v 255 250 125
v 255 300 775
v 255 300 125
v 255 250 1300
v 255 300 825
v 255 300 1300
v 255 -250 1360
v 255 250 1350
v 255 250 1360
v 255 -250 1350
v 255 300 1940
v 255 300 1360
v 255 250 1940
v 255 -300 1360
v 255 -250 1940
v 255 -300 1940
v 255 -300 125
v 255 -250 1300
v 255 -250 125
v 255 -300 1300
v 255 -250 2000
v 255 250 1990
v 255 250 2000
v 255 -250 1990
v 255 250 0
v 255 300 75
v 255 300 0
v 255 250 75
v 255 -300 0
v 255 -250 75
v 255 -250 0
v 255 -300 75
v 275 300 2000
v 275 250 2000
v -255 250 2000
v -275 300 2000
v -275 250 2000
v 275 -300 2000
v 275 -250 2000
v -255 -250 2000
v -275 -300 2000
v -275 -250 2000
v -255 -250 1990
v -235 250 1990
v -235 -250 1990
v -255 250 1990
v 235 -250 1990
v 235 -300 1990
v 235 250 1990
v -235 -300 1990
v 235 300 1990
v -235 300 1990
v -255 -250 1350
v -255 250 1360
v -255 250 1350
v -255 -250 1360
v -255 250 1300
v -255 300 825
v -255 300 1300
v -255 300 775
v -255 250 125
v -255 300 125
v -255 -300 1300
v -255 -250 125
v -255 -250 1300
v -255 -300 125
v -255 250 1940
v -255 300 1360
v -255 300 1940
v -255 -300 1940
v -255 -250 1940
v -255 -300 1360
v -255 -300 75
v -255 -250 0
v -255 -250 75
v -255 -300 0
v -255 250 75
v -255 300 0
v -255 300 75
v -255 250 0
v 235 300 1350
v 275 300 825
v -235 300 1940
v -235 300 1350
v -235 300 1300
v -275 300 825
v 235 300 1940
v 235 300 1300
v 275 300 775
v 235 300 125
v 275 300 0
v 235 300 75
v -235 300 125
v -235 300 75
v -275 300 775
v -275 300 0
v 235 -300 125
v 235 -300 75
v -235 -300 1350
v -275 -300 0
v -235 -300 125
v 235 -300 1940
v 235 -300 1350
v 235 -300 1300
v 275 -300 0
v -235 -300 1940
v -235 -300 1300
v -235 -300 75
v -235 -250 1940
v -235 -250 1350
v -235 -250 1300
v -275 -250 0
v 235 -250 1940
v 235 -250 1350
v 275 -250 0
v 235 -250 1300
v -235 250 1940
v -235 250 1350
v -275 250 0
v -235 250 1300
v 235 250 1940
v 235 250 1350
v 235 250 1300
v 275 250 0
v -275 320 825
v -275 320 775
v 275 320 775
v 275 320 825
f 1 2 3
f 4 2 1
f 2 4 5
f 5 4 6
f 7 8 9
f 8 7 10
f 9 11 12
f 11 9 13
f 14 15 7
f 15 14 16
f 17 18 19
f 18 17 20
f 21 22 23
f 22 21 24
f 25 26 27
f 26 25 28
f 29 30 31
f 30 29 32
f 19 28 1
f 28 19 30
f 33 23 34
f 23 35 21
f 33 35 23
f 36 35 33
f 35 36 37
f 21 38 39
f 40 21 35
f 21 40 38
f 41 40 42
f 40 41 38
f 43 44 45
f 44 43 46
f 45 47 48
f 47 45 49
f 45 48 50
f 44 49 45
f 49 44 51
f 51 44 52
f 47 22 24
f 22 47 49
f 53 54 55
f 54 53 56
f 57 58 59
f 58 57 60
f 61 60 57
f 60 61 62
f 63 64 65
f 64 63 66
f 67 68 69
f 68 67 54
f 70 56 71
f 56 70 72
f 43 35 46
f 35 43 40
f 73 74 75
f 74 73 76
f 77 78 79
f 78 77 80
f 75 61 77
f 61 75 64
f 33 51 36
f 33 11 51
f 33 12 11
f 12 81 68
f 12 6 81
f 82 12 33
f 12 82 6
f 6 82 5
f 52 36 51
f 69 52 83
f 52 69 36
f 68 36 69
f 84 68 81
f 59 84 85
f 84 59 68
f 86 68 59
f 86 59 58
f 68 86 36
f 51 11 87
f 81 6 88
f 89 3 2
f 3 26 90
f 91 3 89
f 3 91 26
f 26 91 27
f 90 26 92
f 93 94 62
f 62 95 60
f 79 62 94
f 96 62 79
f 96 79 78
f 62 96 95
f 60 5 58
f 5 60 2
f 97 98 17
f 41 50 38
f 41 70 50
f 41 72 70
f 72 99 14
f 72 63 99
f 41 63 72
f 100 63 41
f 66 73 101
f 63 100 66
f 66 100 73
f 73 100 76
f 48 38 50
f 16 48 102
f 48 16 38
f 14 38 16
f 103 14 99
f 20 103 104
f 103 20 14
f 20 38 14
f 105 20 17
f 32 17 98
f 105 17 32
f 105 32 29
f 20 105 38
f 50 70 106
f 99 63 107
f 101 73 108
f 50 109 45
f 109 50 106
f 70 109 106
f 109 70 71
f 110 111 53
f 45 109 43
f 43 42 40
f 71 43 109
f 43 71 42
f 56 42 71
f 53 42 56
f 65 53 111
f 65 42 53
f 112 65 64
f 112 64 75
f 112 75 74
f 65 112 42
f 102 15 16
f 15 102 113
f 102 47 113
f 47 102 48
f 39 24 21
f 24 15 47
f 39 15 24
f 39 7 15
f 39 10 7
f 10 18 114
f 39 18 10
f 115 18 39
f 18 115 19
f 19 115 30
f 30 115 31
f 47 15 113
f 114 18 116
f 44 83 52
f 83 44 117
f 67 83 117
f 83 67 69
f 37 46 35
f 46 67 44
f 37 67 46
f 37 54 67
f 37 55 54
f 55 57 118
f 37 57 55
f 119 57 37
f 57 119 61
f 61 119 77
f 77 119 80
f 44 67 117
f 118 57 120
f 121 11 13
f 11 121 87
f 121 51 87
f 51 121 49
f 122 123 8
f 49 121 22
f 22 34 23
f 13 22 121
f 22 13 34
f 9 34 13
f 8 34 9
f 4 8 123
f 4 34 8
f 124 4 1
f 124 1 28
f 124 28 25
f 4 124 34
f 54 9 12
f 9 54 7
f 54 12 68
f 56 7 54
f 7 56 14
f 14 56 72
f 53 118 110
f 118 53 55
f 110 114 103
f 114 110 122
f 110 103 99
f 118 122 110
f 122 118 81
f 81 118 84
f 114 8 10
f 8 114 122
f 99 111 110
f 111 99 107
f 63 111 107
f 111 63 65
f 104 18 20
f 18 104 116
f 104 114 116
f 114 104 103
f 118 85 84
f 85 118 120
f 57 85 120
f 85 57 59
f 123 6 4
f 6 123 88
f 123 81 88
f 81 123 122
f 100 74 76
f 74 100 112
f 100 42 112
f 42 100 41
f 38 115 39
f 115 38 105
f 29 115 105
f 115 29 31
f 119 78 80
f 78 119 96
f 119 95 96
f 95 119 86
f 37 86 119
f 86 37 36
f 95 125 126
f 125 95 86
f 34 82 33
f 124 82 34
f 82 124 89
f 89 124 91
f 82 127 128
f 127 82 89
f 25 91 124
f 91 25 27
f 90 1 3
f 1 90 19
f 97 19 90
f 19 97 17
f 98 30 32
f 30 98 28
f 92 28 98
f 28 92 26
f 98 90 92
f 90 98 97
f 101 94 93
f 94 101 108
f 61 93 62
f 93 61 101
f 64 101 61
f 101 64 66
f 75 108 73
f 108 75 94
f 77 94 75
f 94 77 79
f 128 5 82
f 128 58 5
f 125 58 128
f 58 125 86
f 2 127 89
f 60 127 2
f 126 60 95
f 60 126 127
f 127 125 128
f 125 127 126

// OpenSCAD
feet_thickness = 20;
feet_width = 50;
height = 2000;
width = 550 - feet_thickness * 2;
depth = 600;

ply_thickness = 10;

module wood(w, h, d) {
    cube(size=[w, h, d], center=true);
    echo("Wood: ", w, h, d);
}

// Feet
translate([-(width + feet_thickness) * 0.5, -(depth - feet_width) * 0.5, height * 0.5]) {
    wood(feet_thickness, feet_width, height);
}
translate([(width + feet_thickness) * 0.5, -(depth - feet_width) * 0.5, height * 0.5]) {
    wood(feet_thickness, feet_width, height);
}
translate([-(width + feet_thickness) * 0.5, (depth - feet_width) * 0.5, height * 0.5]) {
    wood(feet_thickness, feet_width, height);
}
translate([(width + feet_thickness) * 0.5, (depth - feet_width) * 0.5, height * 0.5]) {
    wood(feet_thickness, feet_width, height);
}

// Shelves
module shelf(pos_y) {
    block_height = 50; // Doesn't really matter
    union() {
        translate([0, 0, pos_y + ply_thickness * 0.5]) {
            wood(width, depth, ply_thickness);
        }
        translate([-(width - feet_thickness) * 0.5, -(depth - feet_width) * 0.5, pos_y - block_height * 0.5]) {
           wood(feet_thickness, feet_width, block_height);
        }
        translate([(width - feet_thickness) * 0.5, -(depth - feet_width) * 0.5, pos_y - block_height * 0.5]) {
           wood(feet_thickness, feet_width, block_height);
        }
        translate([-(width - feet_thickness) * 0.5, (depth - feet_width) * 0.5, pos_y - block_height * 0.5]) {
           wood(feet_thickness, feet_width, block_height);
        }
        translate([(width - feet_thickness) * 0.5, (depth - feet_width) * 0.5, pos_y - block_height * 0.5]) {
           wood(feet_thickness, feet_width, block_height);
        }
    }
}

shelf(height - ply_thickness);
shelf(1350);

plank_width=feet_width;
translate([(width - feet_thickness) * 0.5, 0, 100]) {
    wood(feet_thickness, depth, plank_width);
}
translate([-(width - feet_thickness) * 0.5, 0, 100]) {
    wood(feet_thickness, depth, plank_width);
}
translate([-(width - feet_thickness) * 0.5, 0, 100]) {
    wood(feet_thickness, depth, plank_width);
}
translate([0, (depth + feet_thickness) * 0.5, 800]) {
    wood(width + 2 * feet_thickness, feet_thickness, plank_width);
}
